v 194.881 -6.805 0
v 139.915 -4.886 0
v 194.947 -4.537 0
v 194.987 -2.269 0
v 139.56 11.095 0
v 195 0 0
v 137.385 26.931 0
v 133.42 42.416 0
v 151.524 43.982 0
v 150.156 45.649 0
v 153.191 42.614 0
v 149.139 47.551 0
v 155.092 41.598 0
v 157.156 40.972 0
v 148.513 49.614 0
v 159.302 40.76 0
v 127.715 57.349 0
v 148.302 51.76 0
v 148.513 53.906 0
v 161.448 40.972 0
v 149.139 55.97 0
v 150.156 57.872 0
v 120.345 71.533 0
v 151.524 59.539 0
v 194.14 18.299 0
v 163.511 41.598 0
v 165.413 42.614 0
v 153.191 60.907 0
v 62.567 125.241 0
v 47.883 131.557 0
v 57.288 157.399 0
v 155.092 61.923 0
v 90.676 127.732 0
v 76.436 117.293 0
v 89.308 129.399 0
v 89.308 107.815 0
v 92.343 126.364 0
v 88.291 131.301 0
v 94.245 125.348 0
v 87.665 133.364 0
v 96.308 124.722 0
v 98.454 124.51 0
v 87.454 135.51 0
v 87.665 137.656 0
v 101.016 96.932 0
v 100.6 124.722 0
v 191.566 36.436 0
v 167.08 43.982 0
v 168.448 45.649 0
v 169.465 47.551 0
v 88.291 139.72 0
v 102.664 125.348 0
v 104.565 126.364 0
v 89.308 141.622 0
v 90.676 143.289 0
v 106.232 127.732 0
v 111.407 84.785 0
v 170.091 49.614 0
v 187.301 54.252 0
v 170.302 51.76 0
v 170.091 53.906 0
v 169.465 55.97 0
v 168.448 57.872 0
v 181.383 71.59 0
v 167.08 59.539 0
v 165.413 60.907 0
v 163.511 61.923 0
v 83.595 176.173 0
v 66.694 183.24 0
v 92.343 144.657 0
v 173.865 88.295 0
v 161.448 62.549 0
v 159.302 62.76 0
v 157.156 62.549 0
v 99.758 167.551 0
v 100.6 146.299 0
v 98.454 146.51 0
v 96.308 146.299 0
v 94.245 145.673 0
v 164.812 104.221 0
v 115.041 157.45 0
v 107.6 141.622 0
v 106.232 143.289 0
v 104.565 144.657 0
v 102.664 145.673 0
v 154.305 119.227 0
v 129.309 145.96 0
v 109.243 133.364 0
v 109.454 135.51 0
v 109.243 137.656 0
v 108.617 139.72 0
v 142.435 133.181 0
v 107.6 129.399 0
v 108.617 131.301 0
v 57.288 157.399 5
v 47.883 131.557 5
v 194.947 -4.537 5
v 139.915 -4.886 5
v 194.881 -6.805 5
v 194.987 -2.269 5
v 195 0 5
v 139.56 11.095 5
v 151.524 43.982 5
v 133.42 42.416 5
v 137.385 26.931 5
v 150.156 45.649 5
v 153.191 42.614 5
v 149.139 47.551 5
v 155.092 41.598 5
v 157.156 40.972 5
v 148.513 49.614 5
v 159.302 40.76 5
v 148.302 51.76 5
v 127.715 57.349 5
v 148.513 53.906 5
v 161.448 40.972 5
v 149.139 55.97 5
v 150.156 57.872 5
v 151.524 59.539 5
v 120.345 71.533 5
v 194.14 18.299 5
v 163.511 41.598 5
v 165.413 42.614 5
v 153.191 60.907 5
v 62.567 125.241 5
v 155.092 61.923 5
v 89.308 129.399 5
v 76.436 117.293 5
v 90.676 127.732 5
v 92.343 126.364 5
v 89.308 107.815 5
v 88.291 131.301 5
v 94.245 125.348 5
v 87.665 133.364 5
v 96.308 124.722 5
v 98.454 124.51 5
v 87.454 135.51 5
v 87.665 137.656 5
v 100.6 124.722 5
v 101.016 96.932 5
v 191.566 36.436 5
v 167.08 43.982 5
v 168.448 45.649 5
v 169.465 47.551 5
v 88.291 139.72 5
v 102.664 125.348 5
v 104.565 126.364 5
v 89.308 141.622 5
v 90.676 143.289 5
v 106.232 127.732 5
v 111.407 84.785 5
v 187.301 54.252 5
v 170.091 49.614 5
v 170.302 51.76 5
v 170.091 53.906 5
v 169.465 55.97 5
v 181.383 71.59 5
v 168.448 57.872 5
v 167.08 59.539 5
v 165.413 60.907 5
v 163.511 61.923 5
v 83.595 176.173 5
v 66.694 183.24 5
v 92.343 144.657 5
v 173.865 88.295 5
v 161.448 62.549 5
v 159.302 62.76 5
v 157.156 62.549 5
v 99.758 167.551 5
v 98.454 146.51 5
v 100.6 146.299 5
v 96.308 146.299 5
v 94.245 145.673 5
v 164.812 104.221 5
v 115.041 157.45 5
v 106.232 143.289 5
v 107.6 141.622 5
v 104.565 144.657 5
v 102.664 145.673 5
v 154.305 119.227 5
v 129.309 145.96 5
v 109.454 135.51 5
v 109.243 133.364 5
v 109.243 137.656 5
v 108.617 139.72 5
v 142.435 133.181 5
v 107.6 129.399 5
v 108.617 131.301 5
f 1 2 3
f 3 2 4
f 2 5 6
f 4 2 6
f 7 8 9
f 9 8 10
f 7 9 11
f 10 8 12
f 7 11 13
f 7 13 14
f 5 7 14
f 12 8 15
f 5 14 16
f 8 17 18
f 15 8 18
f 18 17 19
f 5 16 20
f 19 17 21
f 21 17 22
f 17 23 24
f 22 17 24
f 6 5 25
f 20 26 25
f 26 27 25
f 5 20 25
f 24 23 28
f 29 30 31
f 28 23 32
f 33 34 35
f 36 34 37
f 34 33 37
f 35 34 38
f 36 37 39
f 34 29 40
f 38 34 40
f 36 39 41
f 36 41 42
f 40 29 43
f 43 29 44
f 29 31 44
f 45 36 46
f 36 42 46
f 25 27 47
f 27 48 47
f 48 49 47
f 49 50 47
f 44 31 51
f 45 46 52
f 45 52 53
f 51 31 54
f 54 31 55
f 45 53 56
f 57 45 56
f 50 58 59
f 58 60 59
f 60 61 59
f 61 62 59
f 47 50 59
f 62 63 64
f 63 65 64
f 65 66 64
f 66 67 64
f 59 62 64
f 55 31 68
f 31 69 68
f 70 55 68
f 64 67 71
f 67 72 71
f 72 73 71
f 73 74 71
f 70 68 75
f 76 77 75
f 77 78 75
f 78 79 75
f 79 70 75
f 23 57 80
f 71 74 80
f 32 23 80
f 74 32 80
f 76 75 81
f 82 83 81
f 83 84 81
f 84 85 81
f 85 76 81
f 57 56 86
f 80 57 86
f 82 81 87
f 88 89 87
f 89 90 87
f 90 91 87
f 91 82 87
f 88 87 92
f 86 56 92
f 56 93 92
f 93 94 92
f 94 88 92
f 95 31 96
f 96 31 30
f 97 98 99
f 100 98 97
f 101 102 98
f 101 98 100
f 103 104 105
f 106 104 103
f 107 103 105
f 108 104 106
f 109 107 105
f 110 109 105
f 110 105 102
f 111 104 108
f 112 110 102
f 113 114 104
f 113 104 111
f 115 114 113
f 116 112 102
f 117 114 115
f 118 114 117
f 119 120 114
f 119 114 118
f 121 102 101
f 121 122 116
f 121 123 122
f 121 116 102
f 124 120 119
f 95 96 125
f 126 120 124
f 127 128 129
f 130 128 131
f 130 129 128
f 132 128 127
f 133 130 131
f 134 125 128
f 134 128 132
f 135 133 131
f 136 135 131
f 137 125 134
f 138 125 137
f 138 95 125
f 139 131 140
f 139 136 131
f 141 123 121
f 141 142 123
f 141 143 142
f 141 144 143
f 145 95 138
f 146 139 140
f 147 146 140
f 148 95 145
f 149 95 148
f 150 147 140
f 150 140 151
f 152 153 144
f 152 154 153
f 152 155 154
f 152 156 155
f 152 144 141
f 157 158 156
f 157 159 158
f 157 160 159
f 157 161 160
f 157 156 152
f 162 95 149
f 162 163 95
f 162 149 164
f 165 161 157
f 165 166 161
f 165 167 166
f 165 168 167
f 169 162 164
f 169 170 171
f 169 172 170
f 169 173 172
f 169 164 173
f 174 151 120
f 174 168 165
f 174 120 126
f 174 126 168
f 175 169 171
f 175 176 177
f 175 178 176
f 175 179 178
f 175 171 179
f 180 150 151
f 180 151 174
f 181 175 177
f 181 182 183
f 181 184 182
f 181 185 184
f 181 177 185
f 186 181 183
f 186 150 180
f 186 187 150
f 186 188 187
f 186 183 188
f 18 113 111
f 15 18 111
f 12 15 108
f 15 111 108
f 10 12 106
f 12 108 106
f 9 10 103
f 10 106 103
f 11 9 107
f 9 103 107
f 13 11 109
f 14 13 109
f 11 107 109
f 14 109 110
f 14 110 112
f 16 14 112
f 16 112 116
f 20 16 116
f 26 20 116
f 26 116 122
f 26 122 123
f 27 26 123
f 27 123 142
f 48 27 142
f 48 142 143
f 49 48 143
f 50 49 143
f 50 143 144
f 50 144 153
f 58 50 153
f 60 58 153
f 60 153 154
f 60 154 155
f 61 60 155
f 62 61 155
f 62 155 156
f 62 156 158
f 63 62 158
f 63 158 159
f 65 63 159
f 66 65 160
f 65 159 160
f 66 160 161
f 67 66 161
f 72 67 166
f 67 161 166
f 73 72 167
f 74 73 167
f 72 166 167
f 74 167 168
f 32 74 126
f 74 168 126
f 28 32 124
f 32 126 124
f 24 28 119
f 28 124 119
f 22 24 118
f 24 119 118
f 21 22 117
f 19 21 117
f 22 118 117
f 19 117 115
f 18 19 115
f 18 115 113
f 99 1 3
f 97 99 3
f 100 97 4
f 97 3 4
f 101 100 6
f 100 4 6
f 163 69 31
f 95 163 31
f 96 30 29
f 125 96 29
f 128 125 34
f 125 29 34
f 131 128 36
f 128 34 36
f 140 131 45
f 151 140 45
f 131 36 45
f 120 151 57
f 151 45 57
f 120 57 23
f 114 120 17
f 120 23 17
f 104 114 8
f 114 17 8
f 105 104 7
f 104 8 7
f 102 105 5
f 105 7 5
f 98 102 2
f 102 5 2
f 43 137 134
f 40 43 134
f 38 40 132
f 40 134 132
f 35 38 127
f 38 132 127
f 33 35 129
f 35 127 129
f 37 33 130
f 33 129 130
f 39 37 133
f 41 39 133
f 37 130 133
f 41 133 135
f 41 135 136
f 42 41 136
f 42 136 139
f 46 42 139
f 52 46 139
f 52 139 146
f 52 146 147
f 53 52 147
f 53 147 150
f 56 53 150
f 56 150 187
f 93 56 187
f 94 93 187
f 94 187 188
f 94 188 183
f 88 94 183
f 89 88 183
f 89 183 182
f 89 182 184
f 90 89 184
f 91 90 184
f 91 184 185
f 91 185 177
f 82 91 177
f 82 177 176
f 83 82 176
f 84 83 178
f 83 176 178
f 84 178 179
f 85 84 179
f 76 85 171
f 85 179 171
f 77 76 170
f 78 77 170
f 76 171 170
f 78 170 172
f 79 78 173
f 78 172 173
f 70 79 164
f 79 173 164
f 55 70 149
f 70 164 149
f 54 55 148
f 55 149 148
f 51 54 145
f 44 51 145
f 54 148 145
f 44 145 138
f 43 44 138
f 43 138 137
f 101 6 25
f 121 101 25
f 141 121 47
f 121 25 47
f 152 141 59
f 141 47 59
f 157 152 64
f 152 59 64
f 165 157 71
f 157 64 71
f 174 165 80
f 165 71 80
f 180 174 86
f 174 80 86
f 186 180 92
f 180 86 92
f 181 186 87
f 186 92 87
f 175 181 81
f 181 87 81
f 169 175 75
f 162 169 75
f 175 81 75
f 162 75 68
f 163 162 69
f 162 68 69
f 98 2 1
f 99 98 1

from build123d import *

# Parameters (mm, degrees)
F1_DEPTH = 5
F2_D     = 22


with BuildPart() as f1:
    # F0 (on Top) → F1 (new body)
    with BuildSketch(Plane.XY):
        with BuildLine():
            ThreePointArc((167.5, 0), (137.2079674184, 96.0740530888), (57.288374007, 157.3985139816))
            Line((57.288374007, 157.3985139816), (47.8828200656, 131.55696691))
            ThreePointArc((47.8828200656, 131.55696691), (114.6812862005, 80.3007010891), (140, 0))
            ThreePointArc((140, 0), (139.9786773219, -2.4433369012), (139.9147157827, -4.8859295383))
            Line((139.9147157827, -4.8859295384), (167.3979635257, -5.8456656977))
            ThreePointArc((167.3979635257, -5.8456656977), (167.4744889387, -2.9232780782), (167.5, 0))
        make_face()
        with BuildLine():
            ThreePointArc((194.8812112687, -6.805401857), (194.9703005555, -3.4032192553), (195, 0))
            ThreePointArc((195, 0), (159.7346486364, 111.8474050885), (66.6939279485, 183.2400610533))
            Line((66.6939279485, 183.2400610533), (57.288374007, 157.3985139816))
            ThreePointArc((57.288374007, 157.3985139816), (137.2079674184, 96.0740530888), (167.5, 0))
            ThreePointArc((167.5, 0), (167.4744889387, -2.9232780782), (167.3979635257, -5.8456656977))
            Line((167.3979635257, -5.8456656977), (194.8812112687, -6.805401857))
        make_face()
    extrude(amount=F1_DEPTH)

    # F2 (through all)
    with Locations(Plane(origin=(0, 0, 0), x_dir=(1, 0, 0), z_dir=(0, 0, -1))):
        with Locations((98.454029759, -135.5103465578), (159.3019664794, -51.7603465578), (159.3019664794, 51.7603465578)):
            Hole(F2_D / 2)


solid = f1.part
